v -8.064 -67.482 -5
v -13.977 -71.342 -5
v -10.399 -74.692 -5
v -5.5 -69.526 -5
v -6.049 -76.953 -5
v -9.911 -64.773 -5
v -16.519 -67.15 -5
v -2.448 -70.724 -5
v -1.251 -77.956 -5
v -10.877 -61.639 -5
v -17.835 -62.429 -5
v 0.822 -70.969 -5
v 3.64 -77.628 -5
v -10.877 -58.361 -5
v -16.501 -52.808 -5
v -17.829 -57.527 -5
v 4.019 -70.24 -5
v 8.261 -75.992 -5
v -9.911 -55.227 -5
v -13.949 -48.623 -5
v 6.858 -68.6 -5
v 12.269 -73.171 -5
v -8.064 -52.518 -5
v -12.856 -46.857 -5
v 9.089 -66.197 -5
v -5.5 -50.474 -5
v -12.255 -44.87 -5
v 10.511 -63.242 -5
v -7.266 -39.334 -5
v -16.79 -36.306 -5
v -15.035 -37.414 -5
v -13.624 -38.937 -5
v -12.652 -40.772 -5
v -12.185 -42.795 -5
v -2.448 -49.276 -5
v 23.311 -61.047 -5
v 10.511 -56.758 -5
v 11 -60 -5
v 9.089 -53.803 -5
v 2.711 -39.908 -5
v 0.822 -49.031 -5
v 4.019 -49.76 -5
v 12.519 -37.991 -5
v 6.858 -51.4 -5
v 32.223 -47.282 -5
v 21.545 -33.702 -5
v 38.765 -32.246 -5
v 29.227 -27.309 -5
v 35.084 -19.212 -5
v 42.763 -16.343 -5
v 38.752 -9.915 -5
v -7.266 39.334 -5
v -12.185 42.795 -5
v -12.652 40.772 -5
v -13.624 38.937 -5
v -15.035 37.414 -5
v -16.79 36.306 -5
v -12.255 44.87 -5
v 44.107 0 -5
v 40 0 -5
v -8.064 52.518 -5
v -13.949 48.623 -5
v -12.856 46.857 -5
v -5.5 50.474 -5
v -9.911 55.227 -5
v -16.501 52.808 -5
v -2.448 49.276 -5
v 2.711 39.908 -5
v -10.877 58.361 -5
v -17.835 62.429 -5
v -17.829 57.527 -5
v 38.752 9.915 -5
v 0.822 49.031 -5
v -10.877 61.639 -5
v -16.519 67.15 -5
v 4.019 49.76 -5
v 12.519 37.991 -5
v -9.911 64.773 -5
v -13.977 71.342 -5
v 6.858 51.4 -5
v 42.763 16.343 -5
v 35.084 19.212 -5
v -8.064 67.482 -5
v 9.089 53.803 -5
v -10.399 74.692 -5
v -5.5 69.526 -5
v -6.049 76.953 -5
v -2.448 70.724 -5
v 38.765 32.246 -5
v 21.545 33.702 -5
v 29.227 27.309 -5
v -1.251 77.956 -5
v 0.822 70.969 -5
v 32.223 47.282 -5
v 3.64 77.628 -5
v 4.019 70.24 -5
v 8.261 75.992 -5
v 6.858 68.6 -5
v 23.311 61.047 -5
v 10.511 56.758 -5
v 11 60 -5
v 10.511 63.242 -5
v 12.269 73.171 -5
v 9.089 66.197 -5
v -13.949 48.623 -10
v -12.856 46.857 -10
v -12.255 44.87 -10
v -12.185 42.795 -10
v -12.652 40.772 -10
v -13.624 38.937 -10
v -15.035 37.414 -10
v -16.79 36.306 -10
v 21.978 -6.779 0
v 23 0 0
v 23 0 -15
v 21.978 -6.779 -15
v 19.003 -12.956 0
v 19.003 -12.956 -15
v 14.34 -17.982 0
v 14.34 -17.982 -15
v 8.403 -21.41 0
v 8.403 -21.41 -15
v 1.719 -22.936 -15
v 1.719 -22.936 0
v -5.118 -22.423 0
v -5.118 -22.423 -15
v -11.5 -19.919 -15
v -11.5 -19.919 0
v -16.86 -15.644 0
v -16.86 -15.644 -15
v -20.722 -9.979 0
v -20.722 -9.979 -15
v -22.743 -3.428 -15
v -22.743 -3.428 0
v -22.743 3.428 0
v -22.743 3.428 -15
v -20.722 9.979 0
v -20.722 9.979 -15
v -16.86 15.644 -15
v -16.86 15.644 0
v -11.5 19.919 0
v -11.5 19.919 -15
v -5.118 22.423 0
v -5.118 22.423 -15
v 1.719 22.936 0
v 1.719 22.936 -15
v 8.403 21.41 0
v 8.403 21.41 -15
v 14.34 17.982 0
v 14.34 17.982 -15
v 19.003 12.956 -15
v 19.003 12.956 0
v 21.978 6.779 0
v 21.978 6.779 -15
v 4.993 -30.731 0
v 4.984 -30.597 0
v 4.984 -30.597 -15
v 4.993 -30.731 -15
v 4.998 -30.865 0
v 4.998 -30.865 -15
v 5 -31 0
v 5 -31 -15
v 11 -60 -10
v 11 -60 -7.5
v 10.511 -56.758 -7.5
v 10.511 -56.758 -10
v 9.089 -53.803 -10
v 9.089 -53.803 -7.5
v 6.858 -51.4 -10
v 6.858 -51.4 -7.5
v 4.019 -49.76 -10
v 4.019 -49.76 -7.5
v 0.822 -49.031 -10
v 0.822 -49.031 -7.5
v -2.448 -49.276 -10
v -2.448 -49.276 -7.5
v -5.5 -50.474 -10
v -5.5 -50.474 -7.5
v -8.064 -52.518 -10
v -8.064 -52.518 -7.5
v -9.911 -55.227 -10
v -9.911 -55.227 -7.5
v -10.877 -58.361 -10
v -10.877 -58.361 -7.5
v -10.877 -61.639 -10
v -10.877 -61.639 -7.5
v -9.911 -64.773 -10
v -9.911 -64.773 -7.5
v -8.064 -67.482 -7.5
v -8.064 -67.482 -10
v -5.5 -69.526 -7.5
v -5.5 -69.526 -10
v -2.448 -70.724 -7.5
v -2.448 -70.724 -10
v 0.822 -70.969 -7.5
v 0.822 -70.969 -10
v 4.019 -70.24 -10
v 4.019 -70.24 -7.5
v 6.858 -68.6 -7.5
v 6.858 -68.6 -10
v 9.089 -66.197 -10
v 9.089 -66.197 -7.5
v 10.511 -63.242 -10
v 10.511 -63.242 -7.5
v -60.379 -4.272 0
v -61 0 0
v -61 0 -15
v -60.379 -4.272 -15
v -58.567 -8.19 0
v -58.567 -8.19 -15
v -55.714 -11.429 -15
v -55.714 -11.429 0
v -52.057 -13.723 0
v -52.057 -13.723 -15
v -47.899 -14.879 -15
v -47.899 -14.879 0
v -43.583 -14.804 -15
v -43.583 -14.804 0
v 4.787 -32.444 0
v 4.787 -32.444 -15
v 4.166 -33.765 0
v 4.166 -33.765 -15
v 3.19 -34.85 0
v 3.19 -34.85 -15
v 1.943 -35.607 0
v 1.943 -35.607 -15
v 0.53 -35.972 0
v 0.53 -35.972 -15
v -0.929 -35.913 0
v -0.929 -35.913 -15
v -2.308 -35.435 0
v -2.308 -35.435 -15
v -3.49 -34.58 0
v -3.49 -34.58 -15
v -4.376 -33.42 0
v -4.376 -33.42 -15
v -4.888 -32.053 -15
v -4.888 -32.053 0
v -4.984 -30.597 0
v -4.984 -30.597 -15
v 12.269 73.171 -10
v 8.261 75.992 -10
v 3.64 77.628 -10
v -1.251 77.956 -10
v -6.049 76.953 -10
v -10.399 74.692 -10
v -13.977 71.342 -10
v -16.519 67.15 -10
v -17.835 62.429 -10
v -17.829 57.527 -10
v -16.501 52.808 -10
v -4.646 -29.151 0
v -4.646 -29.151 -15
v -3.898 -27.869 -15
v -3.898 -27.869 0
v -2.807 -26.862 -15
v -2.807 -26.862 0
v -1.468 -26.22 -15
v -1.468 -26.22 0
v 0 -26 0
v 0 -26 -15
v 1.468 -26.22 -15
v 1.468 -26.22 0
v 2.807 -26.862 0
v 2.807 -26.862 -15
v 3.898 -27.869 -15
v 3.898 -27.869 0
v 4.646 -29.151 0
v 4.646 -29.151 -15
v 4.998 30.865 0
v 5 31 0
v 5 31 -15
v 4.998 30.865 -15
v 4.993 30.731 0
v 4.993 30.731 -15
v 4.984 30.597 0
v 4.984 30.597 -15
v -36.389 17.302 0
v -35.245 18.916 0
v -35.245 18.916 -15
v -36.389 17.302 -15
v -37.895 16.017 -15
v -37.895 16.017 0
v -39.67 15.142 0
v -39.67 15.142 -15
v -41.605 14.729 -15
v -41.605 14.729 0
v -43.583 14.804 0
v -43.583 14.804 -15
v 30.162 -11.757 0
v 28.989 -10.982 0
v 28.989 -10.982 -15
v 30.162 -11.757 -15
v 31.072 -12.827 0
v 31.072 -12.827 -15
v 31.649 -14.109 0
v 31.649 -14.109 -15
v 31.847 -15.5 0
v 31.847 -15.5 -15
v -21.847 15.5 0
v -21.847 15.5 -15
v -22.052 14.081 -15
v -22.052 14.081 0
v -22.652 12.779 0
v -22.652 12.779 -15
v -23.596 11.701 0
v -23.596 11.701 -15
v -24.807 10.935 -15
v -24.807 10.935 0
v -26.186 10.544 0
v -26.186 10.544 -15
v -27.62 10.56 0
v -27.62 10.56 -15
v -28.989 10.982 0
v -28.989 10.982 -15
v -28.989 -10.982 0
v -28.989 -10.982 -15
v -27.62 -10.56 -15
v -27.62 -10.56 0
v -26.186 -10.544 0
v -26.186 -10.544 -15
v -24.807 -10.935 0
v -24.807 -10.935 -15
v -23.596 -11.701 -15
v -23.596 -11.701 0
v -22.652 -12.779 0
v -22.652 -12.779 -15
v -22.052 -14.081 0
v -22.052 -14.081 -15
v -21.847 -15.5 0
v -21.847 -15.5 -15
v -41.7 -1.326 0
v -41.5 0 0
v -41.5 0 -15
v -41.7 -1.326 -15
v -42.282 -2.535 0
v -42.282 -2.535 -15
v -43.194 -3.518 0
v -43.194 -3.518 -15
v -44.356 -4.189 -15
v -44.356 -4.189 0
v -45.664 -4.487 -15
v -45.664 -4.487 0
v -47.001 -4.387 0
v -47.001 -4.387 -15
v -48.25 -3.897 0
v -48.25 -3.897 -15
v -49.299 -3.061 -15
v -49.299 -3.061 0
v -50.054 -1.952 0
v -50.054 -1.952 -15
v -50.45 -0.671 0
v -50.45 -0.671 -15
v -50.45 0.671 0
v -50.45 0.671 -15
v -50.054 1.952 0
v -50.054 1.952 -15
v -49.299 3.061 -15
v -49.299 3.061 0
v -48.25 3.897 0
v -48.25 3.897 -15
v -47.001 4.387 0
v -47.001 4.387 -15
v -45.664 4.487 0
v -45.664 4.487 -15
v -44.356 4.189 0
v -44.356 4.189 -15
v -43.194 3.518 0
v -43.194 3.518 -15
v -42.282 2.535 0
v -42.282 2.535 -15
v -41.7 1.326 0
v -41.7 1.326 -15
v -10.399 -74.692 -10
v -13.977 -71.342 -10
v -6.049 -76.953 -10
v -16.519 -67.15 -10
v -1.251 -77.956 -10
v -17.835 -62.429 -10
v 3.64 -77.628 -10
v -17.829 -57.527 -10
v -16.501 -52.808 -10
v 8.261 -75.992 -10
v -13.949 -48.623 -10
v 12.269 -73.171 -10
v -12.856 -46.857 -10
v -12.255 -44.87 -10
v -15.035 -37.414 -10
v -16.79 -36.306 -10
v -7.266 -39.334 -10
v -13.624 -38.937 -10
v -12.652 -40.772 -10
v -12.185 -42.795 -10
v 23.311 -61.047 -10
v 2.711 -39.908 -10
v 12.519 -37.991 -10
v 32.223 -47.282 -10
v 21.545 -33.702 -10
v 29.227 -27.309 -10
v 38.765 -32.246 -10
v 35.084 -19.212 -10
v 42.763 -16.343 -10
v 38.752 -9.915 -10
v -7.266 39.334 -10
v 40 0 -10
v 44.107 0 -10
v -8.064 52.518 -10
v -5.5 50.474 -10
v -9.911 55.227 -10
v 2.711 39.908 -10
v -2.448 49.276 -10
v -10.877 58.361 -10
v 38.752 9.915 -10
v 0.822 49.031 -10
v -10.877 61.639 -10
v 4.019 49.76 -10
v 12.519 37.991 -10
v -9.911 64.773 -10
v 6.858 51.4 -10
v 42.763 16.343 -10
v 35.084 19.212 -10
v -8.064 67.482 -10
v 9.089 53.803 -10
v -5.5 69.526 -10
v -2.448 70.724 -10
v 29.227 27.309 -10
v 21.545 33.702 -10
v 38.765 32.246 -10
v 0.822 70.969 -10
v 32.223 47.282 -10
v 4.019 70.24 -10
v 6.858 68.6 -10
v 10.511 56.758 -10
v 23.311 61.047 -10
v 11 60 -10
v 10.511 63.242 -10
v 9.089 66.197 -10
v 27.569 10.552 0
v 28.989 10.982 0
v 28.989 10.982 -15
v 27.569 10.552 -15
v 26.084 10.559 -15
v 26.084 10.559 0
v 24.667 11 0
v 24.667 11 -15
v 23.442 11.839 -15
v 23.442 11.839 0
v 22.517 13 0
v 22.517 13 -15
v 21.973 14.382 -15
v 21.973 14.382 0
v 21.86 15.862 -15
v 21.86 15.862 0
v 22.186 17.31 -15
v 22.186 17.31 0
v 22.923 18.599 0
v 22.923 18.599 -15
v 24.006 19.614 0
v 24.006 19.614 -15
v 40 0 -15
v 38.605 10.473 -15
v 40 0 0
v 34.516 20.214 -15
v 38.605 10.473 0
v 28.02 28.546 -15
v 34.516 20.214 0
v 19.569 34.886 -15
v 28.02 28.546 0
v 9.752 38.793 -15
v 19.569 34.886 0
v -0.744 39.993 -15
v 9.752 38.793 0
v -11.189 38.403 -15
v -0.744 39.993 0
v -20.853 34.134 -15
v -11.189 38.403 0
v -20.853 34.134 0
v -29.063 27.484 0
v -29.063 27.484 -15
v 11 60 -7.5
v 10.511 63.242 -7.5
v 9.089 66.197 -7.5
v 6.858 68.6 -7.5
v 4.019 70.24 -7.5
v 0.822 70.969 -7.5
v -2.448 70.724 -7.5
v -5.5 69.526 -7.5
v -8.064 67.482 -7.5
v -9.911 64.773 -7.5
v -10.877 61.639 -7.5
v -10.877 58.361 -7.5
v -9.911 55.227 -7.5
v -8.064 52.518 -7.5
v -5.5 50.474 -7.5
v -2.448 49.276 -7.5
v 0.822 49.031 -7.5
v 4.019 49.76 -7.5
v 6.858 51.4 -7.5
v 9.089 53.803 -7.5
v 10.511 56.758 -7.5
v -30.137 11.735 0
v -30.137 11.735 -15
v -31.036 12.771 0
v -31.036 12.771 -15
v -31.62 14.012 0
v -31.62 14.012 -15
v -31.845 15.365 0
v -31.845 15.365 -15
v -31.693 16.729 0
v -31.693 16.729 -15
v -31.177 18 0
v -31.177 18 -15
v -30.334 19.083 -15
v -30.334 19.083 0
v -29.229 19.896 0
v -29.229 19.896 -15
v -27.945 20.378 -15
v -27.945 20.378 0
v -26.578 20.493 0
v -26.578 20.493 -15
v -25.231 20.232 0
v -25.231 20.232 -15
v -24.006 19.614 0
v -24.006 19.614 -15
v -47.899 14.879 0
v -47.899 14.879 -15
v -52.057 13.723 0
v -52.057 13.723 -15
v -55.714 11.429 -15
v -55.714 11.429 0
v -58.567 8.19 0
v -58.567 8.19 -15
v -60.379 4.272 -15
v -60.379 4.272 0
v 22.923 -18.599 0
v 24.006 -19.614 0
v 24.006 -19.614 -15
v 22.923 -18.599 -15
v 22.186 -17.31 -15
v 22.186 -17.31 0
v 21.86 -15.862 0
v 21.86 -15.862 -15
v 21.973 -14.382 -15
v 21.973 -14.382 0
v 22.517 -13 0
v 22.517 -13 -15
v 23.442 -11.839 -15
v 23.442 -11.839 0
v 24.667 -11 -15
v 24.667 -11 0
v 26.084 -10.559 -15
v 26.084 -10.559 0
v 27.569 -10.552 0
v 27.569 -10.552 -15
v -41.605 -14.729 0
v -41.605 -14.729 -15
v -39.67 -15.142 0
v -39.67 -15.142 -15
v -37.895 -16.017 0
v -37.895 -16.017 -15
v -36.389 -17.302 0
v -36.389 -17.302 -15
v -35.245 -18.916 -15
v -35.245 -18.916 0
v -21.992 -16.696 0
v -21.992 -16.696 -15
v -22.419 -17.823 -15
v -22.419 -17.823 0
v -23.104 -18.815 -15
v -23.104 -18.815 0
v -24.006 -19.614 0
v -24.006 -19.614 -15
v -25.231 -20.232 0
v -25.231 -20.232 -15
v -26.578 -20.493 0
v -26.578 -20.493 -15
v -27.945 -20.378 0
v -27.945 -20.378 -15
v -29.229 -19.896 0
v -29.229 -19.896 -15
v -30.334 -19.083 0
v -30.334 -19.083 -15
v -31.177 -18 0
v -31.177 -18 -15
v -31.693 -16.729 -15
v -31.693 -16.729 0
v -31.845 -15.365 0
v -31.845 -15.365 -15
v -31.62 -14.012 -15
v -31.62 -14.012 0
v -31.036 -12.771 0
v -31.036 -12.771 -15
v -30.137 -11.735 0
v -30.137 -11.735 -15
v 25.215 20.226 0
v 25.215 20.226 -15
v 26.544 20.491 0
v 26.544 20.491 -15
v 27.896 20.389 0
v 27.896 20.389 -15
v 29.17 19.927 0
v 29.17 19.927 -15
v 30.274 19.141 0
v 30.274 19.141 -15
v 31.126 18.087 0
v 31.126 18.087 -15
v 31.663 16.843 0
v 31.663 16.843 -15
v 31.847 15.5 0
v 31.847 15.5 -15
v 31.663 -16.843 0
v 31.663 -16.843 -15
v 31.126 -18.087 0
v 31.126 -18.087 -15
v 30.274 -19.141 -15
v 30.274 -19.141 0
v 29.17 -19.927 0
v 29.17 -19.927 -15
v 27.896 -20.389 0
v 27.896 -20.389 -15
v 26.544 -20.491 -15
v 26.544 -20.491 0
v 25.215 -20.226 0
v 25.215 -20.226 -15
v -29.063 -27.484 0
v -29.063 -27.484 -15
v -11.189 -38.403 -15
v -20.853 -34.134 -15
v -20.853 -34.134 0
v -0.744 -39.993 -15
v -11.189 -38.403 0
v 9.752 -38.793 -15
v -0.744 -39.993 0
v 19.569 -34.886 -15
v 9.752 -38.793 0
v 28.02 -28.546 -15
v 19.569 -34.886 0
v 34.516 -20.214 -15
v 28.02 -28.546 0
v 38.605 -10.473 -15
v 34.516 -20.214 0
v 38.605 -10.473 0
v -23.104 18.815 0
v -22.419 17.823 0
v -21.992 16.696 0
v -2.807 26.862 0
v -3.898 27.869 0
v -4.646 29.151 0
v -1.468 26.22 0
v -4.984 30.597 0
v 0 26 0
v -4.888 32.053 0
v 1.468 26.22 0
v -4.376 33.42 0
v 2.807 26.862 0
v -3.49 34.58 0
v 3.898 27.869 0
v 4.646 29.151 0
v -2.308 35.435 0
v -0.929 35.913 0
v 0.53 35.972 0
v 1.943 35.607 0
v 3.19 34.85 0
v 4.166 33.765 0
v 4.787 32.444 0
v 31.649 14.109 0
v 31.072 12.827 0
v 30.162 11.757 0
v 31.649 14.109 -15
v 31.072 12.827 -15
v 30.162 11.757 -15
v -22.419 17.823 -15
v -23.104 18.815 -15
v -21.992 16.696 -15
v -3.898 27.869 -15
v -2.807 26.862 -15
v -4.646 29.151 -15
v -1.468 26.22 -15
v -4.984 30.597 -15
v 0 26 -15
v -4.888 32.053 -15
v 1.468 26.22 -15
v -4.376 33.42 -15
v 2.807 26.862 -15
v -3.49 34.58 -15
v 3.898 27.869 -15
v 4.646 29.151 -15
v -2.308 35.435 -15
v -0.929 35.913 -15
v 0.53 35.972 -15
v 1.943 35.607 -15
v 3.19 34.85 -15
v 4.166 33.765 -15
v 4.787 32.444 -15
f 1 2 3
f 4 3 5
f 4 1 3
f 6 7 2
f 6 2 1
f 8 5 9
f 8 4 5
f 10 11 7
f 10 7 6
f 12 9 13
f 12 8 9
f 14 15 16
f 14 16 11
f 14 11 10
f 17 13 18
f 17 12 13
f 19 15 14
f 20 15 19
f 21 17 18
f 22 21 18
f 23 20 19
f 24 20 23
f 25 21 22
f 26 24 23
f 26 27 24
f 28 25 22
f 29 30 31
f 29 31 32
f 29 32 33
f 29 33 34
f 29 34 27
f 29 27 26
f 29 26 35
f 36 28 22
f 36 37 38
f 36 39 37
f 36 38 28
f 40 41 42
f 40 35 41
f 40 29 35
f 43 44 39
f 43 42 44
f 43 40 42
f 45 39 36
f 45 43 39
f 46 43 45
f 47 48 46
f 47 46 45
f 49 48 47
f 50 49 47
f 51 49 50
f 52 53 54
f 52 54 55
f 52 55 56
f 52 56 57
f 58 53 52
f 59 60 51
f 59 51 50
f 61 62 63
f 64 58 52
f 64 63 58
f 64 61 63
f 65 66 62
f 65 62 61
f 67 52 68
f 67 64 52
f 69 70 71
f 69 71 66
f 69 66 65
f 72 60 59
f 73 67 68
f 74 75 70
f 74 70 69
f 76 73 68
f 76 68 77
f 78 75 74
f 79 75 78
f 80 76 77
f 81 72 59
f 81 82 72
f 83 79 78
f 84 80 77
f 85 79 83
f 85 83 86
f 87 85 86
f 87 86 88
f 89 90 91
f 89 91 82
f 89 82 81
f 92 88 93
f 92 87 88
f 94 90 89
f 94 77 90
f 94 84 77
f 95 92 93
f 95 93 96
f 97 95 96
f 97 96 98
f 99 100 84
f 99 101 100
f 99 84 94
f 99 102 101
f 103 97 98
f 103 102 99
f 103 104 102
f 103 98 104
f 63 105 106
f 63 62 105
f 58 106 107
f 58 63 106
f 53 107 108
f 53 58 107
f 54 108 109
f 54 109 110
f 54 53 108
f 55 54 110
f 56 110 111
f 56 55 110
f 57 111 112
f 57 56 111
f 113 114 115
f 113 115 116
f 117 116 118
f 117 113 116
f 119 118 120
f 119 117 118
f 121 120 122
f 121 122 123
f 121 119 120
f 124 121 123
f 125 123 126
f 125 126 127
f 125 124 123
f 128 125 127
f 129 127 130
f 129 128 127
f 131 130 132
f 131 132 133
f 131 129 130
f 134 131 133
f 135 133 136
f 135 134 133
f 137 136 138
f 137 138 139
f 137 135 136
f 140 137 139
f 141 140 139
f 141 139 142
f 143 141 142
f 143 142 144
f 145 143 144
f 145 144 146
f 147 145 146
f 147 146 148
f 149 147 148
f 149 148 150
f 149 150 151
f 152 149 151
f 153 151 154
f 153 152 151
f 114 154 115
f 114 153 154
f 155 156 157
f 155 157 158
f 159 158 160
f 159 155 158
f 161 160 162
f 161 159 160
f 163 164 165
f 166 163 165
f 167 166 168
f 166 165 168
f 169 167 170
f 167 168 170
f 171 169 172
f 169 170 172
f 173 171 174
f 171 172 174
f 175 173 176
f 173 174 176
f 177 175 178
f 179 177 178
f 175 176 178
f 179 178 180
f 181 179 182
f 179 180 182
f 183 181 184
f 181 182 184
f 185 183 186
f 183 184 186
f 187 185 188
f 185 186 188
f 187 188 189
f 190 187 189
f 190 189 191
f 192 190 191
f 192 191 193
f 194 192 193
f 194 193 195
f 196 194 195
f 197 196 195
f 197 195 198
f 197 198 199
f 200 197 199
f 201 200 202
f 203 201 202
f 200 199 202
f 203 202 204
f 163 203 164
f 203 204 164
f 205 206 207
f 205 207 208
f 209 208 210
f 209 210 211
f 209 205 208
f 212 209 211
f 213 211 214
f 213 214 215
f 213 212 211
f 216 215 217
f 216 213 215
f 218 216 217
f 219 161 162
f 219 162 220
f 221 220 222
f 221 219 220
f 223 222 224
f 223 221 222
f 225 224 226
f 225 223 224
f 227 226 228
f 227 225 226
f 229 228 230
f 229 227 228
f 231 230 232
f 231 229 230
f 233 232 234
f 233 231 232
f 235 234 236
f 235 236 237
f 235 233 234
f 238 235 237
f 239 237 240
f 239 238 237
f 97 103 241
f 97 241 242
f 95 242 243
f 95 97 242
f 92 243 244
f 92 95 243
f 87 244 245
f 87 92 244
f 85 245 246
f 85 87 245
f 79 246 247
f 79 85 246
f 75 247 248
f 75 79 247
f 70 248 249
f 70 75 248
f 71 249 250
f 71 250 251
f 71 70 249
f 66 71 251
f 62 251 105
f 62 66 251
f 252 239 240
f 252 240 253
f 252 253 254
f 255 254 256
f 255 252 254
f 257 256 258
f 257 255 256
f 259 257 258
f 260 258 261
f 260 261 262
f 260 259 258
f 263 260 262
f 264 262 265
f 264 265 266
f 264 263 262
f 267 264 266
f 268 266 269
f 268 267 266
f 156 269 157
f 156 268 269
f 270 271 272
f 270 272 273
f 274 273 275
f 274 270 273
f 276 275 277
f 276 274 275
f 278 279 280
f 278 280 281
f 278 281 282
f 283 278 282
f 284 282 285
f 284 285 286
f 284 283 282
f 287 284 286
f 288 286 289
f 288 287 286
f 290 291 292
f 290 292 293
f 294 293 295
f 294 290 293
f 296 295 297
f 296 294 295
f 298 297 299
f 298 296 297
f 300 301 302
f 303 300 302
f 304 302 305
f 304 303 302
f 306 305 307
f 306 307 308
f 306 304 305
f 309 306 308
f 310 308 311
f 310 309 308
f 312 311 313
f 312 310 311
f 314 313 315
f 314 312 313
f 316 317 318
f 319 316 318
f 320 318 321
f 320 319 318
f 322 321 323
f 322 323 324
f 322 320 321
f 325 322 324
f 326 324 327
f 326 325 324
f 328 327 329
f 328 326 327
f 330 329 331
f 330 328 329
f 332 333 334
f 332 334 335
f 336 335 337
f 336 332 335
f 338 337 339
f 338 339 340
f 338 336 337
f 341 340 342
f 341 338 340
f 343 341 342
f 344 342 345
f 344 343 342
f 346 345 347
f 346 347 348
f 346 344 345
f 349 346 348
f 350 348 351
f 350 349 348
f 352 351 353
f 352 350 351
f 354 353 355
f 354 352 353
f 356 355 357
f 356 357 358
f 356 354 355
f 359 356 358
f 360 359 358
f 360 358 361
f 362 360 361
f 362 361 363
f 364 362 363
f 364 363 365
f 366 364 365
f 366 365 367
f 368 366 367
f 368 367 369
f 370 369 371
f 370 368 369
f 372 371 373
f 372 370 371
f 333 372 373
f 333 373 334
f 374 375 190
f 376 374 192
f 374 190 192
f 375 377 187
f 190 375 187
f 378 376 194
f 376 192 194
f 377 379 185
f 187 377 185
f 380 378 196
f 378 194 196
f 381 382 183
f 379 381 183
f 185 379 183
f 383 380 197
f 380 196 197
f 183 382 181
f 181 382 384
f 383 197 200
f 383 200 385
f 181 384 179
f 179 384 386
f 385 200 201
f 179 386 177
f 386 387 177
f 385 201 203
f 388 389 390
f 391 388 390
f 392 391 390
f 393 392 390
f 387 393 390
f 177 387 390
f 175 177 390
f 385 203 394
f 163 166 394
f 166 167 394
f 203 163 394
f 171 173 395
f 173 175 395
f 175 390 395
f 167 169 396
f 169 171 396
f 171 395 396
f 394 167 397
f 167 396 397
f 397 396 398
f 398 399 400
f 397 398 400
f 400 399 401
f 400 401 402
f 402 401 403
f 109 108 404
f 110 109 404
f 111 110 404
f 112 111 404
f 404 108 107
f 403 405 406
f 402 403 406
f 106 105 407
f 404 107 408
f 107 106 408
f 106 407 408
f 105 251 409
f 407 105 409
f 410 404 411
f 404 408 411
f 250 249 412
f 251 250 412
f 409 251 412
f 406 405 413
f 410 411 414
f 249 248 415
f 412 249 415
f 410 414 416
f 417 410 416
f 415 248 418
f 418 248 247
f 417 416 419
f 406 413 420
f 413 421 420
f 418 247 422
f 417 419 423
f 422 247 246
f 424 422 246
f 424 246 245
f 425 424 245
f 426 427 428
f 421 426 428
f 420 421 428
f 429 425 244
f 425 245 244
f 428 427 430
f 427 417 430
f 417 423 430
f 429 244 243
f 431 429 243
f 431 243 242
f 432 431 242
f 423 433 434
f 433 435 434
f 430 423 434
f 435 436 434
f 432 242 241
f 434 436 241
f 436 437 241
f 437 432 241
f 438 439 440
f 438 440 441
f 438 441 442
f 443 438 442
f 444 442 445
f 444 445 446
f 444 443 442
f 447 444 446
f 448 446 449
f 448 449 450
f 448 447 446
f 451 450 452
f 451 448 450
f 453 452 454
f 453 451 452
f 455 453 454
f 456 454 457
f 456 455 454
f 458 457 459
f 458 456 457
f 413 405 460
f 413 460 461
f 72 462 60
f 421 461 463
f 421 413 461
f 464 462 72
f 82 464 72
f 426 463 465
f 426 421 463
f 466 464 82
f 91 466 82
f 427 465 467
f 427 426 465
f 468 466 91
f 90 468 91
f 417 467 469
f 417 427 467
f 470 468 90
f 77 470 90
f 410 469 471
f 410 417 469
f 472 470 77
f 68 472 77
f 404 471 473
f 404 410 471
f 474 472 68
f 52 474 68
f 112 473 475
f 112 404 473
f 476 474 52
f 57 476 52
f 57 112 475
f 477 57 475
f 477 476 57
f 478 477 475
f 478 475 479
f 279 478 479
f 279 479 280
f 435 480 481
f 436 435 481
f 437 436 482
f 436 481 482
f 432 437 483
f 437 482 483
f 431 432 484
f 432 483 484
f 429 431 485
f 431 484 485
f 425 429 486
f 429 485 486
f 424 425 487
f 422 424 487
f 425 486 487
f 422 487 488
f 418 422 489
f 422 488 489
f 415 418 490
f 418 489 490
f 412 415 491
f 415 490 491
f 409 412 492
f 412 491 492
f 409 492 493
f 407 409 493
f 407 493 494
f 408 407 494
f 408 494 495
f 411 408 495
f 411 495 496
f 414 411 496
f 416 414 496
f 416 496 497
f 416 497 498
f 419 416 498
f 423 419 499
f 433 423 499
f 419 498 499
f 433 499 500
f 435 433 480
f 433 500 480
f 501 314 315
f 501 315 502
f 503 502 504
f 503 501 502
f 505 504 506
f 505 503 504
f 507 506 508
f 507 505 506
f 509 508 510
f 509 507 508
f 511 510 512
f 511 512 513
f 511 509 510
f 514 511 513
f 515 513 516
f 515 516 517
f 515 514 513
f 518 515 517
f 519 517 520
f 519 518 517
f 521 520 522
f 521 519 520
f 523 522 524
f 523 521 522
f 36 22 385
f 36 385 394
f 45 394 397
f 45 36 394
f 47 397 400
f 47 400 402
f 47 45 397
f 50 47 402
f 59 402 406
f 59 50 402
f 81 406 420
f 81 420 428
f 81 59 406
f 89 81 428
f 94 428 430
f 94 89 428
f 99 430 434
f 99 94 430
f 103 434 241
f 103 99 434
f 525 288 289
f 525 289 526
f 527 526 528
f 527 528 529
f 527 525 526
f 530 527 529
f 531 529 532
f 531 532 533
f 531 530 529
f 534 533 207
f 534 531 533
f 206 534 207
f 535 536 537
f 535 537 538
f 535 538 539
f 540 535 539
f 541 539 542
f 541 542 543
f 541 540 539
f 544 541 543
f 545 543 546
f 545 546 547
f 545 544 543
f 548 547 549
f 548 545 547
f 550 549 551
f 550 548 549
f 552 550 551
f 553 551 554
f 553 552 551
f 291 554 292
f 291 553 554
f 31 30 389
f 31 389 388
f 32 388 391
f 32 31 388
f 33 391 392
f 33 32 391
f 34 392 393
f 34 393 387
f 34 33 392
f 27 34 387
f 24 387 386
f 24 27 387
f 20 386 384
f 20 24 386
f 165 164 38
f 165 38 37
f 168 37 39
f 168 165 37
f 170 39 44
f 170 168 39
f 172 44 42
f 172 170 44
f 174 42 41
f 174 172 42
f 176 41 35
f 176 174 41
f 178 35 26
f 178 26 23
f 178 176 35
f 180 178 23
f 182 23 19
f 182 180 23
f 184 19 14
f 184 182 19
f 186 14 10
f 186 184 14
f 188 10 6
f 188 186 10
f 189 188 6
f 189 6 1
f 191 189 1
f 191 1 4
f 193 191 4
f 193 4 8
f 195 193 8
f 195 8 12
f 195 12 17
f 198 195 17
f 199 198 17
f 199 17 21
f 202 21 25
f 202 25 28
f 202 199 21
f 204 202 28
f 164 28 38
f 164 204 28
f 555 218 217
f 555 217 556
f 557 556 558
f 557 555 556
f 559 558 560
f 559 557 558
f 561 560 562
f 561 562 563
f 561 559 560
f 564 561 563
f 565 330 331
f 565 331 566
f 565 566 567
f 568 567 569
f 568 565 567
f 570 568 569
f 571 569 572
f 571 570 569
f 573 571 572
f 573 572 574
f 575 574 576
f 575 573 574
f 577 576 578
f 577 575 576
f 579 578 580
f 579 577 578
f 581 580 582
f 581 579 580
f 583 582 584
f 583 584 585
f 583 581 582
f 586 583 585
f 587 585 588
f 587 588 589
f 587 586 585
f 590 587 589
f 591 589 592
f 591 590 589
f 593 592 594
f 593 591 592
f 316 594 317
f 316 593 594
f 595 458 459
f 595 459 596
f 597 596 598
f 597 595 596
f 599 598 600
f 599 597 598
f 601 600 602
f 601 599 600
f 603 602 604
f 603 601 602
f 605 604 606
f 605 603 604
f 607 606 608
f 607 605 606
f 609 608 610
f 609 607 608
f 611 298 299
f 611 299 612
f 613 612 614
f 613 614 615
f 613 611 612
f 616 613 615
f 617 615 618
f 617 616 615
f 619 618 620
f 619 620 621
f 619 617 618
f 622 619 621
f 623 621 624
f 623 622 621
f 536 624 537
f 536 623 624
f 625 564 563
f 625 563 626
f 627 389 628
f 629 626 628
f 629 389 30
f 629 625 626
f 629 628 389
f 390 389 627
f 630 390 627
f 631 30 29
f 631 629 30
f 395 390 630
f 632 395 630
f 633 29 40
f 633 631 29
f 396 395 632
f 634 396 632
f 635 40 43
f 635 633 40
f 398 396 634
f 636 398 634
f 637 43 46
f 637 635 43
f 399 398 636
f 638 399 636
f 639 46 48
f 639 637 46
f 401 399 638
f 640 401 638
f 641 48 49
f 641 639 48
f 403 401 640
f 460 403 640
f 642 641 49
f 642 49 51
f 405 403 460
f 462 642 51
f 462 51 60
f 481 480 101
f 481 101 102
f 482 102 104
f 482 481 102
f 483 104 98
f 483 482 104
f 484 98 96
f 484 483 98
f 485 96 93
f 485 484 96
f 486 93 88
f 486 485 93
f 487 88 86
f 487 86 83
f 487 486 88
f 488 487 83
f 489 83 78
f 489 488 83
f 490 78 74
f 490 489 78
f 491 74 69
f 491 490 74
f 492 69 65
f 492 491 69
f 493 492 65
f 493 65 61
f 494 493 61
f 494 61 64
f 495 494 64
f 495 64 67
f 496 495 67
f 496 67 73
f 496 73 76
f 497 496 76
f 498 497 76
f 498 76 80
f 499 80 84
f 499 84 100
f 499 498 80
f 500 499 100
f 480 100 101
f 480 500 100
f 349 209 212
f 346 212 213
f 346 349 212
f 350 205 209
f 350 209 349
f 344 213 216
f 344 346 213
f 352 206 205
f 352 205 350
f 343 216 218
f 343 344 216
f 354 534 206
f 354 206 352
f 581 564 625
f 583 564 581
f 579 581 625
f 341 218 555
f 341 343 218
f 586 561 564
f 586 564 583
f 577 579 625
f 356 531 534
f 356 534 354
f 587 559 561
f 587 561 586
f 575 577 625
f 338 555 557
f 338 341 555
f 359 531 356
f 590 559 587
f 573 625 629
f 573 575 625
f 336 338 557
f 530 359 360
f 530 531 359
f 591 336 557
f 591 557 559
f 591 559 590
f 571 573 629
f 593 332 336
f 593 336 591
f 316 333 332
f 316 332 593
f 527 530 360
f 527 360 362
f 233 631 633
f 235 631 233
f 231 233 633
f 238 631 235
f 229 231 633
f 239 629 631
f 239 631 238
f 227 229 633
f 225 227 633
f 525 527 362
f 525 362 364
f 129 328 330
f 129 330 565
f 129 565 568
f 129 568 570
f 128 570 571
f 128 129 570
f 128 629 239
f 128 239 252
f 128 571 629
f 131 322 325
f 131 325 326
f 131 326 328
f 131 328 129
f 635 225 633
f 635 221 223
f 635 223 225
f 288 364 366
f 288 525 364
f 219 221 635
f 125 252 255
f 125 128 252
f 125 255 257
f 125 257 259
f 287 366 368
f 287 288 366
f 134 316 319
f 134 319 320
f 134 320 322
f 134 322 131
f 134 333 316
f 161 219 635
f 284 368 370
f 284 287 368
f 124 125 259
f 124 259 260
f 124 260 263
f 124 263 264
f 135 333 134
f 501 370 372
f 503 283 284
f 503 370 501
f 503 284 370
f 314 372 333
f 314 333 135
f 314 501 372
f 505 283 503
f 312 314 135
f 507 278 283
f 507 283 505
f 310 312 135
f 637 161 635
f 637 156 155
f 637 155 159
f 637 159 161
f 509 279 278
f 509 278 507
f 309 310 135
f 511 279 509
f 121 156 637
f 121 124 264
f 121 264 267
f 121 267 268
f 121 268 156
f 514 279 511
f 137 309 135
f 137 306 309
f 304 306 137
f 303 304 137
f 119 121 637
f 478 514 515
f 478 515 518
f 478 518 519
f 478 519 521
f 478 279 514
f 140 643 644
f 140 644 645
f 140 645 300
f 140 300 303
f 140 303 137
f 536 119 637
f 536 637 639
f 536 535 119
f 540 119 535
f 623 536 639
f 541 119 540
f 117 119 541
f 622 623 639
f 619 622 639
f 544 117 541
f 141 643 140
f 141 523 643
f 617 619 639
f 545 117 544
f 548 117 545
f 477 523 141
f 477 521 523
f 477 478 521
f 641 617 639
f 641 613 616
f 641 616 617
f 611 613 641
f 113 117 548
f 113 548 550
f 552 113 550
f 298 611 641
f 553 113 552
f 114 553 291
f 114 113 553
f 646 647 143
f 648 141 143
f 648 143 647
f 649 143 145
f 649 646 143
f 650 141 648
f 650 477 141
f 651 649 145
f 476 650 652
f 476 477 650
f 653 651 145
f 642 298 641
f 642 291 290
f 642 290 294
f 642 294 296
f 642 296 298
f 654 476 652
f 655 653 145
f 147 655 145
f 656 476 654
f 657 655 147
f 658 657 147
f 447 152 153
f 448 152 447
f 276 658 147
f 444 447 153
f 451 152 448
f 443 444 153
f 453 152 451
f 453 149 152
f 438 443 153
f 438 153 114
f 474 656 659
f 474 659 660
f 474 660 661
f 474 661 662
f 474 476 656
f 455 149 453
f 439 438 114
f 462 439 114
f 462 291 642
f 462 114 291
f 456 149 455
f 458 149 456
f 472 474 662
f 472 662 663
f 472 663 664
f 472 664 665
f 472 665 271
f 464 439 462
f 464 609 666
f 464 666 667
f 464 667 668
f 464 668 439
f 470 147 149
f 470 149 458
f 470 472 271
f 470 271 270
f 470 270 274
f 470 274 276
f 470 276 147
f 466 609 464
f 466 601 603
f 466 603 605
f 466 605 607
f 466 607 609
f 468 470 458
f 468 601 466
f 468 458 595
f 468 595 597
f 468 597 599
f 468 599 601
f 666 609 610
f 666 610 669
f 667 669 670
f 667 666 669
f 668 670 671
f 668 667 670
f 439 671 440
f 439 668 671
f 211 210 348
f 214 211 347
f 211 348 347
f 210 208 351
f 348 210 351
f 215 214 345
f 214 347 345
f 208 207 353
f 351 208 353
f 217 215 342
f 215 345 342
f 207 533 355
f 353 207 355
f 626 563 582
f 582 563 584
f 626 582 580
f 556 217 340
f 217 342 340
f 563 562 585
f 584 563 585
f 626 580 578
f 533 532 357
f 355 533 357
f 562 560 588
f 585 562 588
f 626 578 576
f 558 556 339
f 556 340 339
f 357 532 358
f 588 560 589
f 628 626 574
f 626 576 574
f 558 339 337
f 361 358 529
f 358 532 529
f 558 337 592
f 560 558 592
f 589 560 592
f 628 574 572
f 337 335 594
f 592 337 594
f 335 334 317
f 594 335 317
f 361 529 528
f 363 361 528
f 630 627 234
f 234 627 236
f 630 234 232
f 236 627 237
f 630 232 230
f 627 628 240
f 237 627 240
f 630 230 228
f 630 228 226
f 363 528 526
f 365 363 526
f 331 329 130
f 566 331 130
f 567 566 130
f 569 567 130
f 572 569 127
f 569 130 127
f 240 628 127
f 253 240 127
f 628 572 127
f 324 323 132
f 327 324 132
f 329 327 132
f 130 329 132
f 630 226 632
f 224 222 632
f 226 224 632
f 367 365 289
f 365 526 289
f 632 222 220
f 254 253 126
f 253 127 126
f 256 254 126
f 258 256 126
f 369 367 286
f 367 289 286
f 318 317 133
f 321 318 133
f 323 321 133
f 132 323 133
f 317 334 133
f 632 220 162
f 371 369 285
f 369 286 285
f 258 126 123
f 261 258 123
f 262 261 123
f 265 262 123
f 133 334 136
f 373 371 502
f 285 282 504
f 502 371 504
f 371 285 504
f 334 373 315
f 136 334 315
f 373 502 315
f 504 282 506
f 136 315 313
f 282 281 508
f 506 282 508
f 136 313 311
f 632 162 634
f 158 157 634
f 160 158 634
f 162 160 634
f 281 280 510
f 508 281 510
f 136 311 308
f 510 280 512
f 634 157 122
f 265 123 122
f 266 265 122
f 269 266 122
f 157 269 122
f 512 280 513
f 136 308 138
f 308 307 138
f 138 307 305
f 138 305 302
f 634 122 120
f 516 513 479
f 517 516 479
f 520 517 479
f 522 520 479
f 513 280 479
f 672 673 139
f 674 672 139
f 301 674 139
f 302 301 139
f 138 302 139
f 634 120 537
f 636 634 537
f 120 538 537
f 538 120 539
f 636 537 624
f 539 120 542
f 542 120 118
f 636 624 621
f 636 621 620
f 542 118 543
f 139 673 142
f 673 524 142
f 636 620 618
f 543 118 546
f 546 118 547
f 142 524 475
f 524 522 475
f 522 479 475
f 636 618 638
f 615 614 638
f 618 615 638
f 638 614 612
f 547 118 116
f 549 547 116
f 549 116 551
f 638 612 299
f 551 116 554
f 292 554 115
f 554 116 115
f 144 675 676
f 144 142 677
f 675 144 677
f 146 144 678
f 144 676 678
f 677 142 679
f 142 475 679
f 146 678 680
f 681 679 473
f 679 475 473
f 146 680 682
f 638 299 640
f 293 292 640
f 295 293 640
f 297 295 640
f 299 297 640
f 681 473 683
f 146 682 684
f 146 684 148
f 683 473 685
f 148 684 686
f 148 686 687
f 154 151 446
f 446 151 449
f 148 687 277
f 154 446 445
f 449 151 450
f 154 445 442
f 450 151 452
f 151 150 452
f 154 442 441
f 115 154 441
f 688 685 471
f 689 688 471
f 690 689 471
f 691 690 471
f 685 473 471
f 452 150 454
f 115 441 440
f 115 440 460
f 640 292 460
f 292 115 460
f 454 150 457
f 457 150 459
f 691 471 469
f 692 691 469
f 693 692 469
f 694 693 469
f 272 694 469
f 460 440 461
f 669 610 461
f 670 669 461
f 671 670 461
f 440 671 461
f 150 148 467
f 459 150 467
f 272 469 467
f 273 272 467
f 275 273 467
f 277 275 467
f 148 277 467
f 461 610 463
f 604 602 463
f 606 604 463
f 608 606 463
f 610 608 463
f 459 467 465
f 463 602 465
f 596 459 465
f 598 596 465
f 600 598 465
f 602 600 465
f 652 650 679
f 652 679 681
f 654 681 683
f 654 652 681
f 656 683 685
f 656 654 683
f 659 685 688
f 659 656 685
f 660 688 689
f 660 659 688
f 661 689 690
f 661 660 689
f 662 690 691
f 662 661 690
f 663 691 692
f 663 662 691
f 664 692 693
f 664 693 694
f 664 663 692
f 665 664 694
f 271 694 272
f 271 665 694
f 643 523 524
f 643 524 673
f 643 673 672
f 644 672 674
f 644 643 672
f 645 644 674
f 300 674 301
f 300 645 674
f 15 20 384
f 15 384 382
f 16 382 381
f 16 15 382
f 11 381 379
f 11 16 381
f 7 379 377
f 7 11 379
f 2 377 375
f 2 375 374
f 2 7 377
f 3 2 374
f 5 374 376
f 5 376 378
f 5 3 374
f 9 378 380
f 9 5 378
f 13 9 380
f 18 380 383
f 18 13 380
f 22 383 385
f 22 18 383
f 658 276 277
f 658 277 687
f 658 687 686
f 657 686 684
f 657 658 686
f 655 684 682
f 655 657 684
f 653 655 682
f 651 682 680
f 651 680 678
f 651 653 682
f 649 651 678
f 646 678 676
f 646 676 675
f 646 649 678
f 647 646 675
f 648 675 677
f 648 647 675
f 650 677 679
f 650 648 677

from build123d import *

# Parameters (mm, degrees)
BOSS_EXTRUDE2_DEPTH = 15
SKETCH2_R           = 18
SKETCH2_R_2         = 11
BOSS_EXTRUDE3_DEPTH = 2.5


with BuildPart() as part:
    # Sketch1 → Boss-Extrude2 (new body)
    with BuildSketch(Plane.XY):
        with BuildLine():
            ThreePointArc((28.989440912, 10.982363845), (30.493217838, 5.582442643), (31, 0))
            Line((31, 0), (40, 0))
            ThreePointArc((40, 0), (9.75236872, 38.792928535), (-35.244565217, 18.91614714))
            ThreePointArc((-35.244565217, 18.91614714), (-38.754967124, 15.524494065), (-43.582703214, 14.80394124))
            ThreePointArc((-43.582703214, 14.80394124), (-55.714436376, 11.429336197), (-61, 0))
            Line((-61, 0), (-50.5, 0))
            ThreePointArc((-50.5, 0), (-46, 4.5), (-41.5, 0))
            Line((-41.5, 0), (-31, 0))
            ThreePointArc((-31, 0), (-30.493217838, 5.582442643), (-28.989440912, 10.982363845))
            ThreePointArc((-28.989440912, 10.982363845), (-31.176914536, 18), (-24.005726539, 19.614410349))
            ThreePointArc((-24.005726539, 19.614410349), (-15.5, 26.846787517), (-4.983714373, 30.596774194))
            ThreePointArc((-4.983714373, 30.596774194), (-0.201777274, 35.995926934), (5, 31))
            ThreePointArc((5, 31), (4.995926934, 30.798222726), (4.983714373, 30.596774194))
            ThreePointArc((4.983714373, 30.596774194), (15.5, 26.846787517), (24.005726539, 19.614410349))
            ThreePointArc((24.005726539, 19.614410349), (29.17000674, 19.927488277), (31.846787517, 15.5))
            ThreePointArc((31.846787517, 15.5), (31.072498521, 12.827292288), (28.989440912, 10.982363845))
        make_face()
        with BuildLine():
            Line((40, 0), (31, 0))
            ThreePointArc((31, 0), (30.493217838, -5.582442643), (28.989440912, -10.982363845))
            ThreePointArc((28.989440912, -10.982363845), (31.072498521, -12.827292288), (31.846787517, -15.5))
            ThreePointArc((31.846787517, -15.5), (29.17000674, -19.927488277), (24.005726539, -19.614410349))
            ThreePointArc((24.005726539, -19.614410349), (15.5, -26.846787517), (4.983714373, -30.596774194))
            ThreePointArc((4.983714373, -30.596774194), (4.995926934, -30.798222726), (5, -31))
            ThreePointArc((5, -31), (-0.201777274, -35.995926934), (-4.983714373, -30.596774194))
            ThreePointArc((-4.983714373, -30.596774194), (-15.5, -26.846787517), (-24.005726539, -19.614410349))
            ThreePointArc((-24.005726539, -19.614410349), (-31.176914536, -18), (-28.989440912, -10.982363845))
            ThreePointArc((-28.989440912, -10.982363845), (-30.493217838, -5.582442643), (-31, 0))
            Line((-31, 0), (-41.5, 0))
            ThreePointArc((-41.5, 0), (-46, -4.5), (-50.5, 0))
            Line((-50.5, 0), (-61, 0))
            ThreePointArc((-61, 0), (-55.714436376, -11.429336197), (-43.582703214, -14.80394124))
            ThreePointArc((-43.582703214, -14.80394124), (-38.754967124, -15.524494065), (-35.244565217, -18.91614714))
            ThreePointArc((-35.244565217, -18.91614714), (9.75236872, -38.792928535), (40, 0))
        make_face()
        with BuildLine():
            ThreePointArc((-23, 0), (0, 23), (23, 0))
            Line((23, 0), (31, 0))
            ThreePointArc((31, 0), (30.493217838, 5.582442643), (28.989440912, 10.982363845))
            ThreePointArc((28.989440912, 10.982363845), (22.516660498, 13), (24.005726539, 19.614410349))
            ThreePointArc((24.005726539, 19.614410349), (15.5, 26.846787517), (4.983714373, 30.596774194))
            ThreePointArc((4.983714373, 30.596774194), (0, 26), (-4.983714373, 30.596774194))
            ThreePointArc((-4.983714373, 30.596774194), (-15.5, 26.846787517), (-24.005726539, 19.614410349))
            ThreePointArc((-24.005726539, 19.614410349), (-22.41929924, 17.823219222), (-21.846787517, 15.5))
            ThreePointArc((-21.846787517, 15.5), (-24.174079805, 11.274288996), (-28.989440912, 10.982363845))
            ThreePointArc((-28.989440912, 10.982363845), (-30.493217838, 5.582442643), (-31, 0))
            Line((-31, 0), (-23, 0))
        make_face()
        with BuildLine():
            Line((31, 0), (23, 0))
            ThreePointArc((23, 0), (0, -23), (-23, 0))
            Line((-23, 0), (-31, 0))
            ThreePointArc((-31, 0), (-30.493217838, -5.582442643), (-28.989440912, -10.982363845))
            ThreePointArc((-28.989440912, -10.982363845), (-24.174079805, -11.274288996), (-21.846787517, -15.5))
            ThreePointArc((-21.846787517, -15.5), (-22.41929924, -17.823219222), (-24.005726539, -19.614410349))
            ThreePointArc((-24.005726539, -19.614410349), (-15.5, -26.846787517), (-4.983714373, -30.596774194))
            ThreePointArc((-4.983714373, -30.596774194), (0, -26), (4.983714373, -30.596774194))
            ThreePointArc((4.983714373, -30.596774194), (15.5, -26.846787517), (24.005726539, -19.614410349))
            ThreePointArc((24.005726539, -19.614410349), (22.516660498, -13), (28.989440912, -10.982363845))
            ThreePointArc((28.989440912, -10.982363845), (30.493217838, -5.582442643), (31, 0))
        make_face()
    extrude(amount=-BOSS_EXTRUDE2_DEPTH)

    # Sketch2 → Boss-Extrude3 (add, symmetric)
    # profile 1 of 3: a face of its own
    with BuildSketch(Plane.XY.offset(-7.5)):
        with BuildLine():
            ThreePointArc((12.269141221, 73.170731707), (16.505219507, 67.181763642), (18, 60))
            ThreePointArc((18, 60), (6.03836873, 43.043051481), (-13.94867812, 48.623076923))
            ThreePointArc((-13.94867812, 48.623076923), (-12.352807509, 41.768456097), (-16.790075515, 36.305555556))
            ThreePointArc((-16.790075515, 36.305555556), (21.545266062, 33.701654415), (40, 0))
            ThreePointArc((40, 0), (21.545266062, -33.701654415), (-16.790075515, -36.305555556))
            ThreePointArc((-16.790075515, -36.305555556), (-12.352807509, -41.768456097), (-13.94867812, -48.623076923))
            ThreePointArc((-13.94867812, -48.623076923), (6.03836873, -43.043051481), (18, -60))
            ThreePointArc((18, -60), (16.505219507, -67.181763642), (12.269141221, -73.170731707))
            ThreePointArc((12.269141221, -73.170731707), (44.10724555, 0), (12.269141221, 73.170731707))
        make_face()
    # profile 2 of 3: a face of its own
    with BuildSketch(Plane.XY.offset(-7.5)):
        with Locations((0, 60)):
            Circle(SKETCH2_R)
        with Locations((0, 60)):
            Circle(SKETCH2_R_2, mode=Mode.SUBTRACT)
    # profile 3 of 3: a face of its own
    with BuildSketch(Plane.XY.offset(-7.5)):
        with Locations((0, -60)):
            Circle(SKETCH2_R)
        with Locations((0, -60)):
            Circle(SKETCH2_R_2, mode=Mode.SUBTRACT)
    extrude(amount=BOSS_EXTRUDE3_DEPTH, both=True)


solid = part.part
